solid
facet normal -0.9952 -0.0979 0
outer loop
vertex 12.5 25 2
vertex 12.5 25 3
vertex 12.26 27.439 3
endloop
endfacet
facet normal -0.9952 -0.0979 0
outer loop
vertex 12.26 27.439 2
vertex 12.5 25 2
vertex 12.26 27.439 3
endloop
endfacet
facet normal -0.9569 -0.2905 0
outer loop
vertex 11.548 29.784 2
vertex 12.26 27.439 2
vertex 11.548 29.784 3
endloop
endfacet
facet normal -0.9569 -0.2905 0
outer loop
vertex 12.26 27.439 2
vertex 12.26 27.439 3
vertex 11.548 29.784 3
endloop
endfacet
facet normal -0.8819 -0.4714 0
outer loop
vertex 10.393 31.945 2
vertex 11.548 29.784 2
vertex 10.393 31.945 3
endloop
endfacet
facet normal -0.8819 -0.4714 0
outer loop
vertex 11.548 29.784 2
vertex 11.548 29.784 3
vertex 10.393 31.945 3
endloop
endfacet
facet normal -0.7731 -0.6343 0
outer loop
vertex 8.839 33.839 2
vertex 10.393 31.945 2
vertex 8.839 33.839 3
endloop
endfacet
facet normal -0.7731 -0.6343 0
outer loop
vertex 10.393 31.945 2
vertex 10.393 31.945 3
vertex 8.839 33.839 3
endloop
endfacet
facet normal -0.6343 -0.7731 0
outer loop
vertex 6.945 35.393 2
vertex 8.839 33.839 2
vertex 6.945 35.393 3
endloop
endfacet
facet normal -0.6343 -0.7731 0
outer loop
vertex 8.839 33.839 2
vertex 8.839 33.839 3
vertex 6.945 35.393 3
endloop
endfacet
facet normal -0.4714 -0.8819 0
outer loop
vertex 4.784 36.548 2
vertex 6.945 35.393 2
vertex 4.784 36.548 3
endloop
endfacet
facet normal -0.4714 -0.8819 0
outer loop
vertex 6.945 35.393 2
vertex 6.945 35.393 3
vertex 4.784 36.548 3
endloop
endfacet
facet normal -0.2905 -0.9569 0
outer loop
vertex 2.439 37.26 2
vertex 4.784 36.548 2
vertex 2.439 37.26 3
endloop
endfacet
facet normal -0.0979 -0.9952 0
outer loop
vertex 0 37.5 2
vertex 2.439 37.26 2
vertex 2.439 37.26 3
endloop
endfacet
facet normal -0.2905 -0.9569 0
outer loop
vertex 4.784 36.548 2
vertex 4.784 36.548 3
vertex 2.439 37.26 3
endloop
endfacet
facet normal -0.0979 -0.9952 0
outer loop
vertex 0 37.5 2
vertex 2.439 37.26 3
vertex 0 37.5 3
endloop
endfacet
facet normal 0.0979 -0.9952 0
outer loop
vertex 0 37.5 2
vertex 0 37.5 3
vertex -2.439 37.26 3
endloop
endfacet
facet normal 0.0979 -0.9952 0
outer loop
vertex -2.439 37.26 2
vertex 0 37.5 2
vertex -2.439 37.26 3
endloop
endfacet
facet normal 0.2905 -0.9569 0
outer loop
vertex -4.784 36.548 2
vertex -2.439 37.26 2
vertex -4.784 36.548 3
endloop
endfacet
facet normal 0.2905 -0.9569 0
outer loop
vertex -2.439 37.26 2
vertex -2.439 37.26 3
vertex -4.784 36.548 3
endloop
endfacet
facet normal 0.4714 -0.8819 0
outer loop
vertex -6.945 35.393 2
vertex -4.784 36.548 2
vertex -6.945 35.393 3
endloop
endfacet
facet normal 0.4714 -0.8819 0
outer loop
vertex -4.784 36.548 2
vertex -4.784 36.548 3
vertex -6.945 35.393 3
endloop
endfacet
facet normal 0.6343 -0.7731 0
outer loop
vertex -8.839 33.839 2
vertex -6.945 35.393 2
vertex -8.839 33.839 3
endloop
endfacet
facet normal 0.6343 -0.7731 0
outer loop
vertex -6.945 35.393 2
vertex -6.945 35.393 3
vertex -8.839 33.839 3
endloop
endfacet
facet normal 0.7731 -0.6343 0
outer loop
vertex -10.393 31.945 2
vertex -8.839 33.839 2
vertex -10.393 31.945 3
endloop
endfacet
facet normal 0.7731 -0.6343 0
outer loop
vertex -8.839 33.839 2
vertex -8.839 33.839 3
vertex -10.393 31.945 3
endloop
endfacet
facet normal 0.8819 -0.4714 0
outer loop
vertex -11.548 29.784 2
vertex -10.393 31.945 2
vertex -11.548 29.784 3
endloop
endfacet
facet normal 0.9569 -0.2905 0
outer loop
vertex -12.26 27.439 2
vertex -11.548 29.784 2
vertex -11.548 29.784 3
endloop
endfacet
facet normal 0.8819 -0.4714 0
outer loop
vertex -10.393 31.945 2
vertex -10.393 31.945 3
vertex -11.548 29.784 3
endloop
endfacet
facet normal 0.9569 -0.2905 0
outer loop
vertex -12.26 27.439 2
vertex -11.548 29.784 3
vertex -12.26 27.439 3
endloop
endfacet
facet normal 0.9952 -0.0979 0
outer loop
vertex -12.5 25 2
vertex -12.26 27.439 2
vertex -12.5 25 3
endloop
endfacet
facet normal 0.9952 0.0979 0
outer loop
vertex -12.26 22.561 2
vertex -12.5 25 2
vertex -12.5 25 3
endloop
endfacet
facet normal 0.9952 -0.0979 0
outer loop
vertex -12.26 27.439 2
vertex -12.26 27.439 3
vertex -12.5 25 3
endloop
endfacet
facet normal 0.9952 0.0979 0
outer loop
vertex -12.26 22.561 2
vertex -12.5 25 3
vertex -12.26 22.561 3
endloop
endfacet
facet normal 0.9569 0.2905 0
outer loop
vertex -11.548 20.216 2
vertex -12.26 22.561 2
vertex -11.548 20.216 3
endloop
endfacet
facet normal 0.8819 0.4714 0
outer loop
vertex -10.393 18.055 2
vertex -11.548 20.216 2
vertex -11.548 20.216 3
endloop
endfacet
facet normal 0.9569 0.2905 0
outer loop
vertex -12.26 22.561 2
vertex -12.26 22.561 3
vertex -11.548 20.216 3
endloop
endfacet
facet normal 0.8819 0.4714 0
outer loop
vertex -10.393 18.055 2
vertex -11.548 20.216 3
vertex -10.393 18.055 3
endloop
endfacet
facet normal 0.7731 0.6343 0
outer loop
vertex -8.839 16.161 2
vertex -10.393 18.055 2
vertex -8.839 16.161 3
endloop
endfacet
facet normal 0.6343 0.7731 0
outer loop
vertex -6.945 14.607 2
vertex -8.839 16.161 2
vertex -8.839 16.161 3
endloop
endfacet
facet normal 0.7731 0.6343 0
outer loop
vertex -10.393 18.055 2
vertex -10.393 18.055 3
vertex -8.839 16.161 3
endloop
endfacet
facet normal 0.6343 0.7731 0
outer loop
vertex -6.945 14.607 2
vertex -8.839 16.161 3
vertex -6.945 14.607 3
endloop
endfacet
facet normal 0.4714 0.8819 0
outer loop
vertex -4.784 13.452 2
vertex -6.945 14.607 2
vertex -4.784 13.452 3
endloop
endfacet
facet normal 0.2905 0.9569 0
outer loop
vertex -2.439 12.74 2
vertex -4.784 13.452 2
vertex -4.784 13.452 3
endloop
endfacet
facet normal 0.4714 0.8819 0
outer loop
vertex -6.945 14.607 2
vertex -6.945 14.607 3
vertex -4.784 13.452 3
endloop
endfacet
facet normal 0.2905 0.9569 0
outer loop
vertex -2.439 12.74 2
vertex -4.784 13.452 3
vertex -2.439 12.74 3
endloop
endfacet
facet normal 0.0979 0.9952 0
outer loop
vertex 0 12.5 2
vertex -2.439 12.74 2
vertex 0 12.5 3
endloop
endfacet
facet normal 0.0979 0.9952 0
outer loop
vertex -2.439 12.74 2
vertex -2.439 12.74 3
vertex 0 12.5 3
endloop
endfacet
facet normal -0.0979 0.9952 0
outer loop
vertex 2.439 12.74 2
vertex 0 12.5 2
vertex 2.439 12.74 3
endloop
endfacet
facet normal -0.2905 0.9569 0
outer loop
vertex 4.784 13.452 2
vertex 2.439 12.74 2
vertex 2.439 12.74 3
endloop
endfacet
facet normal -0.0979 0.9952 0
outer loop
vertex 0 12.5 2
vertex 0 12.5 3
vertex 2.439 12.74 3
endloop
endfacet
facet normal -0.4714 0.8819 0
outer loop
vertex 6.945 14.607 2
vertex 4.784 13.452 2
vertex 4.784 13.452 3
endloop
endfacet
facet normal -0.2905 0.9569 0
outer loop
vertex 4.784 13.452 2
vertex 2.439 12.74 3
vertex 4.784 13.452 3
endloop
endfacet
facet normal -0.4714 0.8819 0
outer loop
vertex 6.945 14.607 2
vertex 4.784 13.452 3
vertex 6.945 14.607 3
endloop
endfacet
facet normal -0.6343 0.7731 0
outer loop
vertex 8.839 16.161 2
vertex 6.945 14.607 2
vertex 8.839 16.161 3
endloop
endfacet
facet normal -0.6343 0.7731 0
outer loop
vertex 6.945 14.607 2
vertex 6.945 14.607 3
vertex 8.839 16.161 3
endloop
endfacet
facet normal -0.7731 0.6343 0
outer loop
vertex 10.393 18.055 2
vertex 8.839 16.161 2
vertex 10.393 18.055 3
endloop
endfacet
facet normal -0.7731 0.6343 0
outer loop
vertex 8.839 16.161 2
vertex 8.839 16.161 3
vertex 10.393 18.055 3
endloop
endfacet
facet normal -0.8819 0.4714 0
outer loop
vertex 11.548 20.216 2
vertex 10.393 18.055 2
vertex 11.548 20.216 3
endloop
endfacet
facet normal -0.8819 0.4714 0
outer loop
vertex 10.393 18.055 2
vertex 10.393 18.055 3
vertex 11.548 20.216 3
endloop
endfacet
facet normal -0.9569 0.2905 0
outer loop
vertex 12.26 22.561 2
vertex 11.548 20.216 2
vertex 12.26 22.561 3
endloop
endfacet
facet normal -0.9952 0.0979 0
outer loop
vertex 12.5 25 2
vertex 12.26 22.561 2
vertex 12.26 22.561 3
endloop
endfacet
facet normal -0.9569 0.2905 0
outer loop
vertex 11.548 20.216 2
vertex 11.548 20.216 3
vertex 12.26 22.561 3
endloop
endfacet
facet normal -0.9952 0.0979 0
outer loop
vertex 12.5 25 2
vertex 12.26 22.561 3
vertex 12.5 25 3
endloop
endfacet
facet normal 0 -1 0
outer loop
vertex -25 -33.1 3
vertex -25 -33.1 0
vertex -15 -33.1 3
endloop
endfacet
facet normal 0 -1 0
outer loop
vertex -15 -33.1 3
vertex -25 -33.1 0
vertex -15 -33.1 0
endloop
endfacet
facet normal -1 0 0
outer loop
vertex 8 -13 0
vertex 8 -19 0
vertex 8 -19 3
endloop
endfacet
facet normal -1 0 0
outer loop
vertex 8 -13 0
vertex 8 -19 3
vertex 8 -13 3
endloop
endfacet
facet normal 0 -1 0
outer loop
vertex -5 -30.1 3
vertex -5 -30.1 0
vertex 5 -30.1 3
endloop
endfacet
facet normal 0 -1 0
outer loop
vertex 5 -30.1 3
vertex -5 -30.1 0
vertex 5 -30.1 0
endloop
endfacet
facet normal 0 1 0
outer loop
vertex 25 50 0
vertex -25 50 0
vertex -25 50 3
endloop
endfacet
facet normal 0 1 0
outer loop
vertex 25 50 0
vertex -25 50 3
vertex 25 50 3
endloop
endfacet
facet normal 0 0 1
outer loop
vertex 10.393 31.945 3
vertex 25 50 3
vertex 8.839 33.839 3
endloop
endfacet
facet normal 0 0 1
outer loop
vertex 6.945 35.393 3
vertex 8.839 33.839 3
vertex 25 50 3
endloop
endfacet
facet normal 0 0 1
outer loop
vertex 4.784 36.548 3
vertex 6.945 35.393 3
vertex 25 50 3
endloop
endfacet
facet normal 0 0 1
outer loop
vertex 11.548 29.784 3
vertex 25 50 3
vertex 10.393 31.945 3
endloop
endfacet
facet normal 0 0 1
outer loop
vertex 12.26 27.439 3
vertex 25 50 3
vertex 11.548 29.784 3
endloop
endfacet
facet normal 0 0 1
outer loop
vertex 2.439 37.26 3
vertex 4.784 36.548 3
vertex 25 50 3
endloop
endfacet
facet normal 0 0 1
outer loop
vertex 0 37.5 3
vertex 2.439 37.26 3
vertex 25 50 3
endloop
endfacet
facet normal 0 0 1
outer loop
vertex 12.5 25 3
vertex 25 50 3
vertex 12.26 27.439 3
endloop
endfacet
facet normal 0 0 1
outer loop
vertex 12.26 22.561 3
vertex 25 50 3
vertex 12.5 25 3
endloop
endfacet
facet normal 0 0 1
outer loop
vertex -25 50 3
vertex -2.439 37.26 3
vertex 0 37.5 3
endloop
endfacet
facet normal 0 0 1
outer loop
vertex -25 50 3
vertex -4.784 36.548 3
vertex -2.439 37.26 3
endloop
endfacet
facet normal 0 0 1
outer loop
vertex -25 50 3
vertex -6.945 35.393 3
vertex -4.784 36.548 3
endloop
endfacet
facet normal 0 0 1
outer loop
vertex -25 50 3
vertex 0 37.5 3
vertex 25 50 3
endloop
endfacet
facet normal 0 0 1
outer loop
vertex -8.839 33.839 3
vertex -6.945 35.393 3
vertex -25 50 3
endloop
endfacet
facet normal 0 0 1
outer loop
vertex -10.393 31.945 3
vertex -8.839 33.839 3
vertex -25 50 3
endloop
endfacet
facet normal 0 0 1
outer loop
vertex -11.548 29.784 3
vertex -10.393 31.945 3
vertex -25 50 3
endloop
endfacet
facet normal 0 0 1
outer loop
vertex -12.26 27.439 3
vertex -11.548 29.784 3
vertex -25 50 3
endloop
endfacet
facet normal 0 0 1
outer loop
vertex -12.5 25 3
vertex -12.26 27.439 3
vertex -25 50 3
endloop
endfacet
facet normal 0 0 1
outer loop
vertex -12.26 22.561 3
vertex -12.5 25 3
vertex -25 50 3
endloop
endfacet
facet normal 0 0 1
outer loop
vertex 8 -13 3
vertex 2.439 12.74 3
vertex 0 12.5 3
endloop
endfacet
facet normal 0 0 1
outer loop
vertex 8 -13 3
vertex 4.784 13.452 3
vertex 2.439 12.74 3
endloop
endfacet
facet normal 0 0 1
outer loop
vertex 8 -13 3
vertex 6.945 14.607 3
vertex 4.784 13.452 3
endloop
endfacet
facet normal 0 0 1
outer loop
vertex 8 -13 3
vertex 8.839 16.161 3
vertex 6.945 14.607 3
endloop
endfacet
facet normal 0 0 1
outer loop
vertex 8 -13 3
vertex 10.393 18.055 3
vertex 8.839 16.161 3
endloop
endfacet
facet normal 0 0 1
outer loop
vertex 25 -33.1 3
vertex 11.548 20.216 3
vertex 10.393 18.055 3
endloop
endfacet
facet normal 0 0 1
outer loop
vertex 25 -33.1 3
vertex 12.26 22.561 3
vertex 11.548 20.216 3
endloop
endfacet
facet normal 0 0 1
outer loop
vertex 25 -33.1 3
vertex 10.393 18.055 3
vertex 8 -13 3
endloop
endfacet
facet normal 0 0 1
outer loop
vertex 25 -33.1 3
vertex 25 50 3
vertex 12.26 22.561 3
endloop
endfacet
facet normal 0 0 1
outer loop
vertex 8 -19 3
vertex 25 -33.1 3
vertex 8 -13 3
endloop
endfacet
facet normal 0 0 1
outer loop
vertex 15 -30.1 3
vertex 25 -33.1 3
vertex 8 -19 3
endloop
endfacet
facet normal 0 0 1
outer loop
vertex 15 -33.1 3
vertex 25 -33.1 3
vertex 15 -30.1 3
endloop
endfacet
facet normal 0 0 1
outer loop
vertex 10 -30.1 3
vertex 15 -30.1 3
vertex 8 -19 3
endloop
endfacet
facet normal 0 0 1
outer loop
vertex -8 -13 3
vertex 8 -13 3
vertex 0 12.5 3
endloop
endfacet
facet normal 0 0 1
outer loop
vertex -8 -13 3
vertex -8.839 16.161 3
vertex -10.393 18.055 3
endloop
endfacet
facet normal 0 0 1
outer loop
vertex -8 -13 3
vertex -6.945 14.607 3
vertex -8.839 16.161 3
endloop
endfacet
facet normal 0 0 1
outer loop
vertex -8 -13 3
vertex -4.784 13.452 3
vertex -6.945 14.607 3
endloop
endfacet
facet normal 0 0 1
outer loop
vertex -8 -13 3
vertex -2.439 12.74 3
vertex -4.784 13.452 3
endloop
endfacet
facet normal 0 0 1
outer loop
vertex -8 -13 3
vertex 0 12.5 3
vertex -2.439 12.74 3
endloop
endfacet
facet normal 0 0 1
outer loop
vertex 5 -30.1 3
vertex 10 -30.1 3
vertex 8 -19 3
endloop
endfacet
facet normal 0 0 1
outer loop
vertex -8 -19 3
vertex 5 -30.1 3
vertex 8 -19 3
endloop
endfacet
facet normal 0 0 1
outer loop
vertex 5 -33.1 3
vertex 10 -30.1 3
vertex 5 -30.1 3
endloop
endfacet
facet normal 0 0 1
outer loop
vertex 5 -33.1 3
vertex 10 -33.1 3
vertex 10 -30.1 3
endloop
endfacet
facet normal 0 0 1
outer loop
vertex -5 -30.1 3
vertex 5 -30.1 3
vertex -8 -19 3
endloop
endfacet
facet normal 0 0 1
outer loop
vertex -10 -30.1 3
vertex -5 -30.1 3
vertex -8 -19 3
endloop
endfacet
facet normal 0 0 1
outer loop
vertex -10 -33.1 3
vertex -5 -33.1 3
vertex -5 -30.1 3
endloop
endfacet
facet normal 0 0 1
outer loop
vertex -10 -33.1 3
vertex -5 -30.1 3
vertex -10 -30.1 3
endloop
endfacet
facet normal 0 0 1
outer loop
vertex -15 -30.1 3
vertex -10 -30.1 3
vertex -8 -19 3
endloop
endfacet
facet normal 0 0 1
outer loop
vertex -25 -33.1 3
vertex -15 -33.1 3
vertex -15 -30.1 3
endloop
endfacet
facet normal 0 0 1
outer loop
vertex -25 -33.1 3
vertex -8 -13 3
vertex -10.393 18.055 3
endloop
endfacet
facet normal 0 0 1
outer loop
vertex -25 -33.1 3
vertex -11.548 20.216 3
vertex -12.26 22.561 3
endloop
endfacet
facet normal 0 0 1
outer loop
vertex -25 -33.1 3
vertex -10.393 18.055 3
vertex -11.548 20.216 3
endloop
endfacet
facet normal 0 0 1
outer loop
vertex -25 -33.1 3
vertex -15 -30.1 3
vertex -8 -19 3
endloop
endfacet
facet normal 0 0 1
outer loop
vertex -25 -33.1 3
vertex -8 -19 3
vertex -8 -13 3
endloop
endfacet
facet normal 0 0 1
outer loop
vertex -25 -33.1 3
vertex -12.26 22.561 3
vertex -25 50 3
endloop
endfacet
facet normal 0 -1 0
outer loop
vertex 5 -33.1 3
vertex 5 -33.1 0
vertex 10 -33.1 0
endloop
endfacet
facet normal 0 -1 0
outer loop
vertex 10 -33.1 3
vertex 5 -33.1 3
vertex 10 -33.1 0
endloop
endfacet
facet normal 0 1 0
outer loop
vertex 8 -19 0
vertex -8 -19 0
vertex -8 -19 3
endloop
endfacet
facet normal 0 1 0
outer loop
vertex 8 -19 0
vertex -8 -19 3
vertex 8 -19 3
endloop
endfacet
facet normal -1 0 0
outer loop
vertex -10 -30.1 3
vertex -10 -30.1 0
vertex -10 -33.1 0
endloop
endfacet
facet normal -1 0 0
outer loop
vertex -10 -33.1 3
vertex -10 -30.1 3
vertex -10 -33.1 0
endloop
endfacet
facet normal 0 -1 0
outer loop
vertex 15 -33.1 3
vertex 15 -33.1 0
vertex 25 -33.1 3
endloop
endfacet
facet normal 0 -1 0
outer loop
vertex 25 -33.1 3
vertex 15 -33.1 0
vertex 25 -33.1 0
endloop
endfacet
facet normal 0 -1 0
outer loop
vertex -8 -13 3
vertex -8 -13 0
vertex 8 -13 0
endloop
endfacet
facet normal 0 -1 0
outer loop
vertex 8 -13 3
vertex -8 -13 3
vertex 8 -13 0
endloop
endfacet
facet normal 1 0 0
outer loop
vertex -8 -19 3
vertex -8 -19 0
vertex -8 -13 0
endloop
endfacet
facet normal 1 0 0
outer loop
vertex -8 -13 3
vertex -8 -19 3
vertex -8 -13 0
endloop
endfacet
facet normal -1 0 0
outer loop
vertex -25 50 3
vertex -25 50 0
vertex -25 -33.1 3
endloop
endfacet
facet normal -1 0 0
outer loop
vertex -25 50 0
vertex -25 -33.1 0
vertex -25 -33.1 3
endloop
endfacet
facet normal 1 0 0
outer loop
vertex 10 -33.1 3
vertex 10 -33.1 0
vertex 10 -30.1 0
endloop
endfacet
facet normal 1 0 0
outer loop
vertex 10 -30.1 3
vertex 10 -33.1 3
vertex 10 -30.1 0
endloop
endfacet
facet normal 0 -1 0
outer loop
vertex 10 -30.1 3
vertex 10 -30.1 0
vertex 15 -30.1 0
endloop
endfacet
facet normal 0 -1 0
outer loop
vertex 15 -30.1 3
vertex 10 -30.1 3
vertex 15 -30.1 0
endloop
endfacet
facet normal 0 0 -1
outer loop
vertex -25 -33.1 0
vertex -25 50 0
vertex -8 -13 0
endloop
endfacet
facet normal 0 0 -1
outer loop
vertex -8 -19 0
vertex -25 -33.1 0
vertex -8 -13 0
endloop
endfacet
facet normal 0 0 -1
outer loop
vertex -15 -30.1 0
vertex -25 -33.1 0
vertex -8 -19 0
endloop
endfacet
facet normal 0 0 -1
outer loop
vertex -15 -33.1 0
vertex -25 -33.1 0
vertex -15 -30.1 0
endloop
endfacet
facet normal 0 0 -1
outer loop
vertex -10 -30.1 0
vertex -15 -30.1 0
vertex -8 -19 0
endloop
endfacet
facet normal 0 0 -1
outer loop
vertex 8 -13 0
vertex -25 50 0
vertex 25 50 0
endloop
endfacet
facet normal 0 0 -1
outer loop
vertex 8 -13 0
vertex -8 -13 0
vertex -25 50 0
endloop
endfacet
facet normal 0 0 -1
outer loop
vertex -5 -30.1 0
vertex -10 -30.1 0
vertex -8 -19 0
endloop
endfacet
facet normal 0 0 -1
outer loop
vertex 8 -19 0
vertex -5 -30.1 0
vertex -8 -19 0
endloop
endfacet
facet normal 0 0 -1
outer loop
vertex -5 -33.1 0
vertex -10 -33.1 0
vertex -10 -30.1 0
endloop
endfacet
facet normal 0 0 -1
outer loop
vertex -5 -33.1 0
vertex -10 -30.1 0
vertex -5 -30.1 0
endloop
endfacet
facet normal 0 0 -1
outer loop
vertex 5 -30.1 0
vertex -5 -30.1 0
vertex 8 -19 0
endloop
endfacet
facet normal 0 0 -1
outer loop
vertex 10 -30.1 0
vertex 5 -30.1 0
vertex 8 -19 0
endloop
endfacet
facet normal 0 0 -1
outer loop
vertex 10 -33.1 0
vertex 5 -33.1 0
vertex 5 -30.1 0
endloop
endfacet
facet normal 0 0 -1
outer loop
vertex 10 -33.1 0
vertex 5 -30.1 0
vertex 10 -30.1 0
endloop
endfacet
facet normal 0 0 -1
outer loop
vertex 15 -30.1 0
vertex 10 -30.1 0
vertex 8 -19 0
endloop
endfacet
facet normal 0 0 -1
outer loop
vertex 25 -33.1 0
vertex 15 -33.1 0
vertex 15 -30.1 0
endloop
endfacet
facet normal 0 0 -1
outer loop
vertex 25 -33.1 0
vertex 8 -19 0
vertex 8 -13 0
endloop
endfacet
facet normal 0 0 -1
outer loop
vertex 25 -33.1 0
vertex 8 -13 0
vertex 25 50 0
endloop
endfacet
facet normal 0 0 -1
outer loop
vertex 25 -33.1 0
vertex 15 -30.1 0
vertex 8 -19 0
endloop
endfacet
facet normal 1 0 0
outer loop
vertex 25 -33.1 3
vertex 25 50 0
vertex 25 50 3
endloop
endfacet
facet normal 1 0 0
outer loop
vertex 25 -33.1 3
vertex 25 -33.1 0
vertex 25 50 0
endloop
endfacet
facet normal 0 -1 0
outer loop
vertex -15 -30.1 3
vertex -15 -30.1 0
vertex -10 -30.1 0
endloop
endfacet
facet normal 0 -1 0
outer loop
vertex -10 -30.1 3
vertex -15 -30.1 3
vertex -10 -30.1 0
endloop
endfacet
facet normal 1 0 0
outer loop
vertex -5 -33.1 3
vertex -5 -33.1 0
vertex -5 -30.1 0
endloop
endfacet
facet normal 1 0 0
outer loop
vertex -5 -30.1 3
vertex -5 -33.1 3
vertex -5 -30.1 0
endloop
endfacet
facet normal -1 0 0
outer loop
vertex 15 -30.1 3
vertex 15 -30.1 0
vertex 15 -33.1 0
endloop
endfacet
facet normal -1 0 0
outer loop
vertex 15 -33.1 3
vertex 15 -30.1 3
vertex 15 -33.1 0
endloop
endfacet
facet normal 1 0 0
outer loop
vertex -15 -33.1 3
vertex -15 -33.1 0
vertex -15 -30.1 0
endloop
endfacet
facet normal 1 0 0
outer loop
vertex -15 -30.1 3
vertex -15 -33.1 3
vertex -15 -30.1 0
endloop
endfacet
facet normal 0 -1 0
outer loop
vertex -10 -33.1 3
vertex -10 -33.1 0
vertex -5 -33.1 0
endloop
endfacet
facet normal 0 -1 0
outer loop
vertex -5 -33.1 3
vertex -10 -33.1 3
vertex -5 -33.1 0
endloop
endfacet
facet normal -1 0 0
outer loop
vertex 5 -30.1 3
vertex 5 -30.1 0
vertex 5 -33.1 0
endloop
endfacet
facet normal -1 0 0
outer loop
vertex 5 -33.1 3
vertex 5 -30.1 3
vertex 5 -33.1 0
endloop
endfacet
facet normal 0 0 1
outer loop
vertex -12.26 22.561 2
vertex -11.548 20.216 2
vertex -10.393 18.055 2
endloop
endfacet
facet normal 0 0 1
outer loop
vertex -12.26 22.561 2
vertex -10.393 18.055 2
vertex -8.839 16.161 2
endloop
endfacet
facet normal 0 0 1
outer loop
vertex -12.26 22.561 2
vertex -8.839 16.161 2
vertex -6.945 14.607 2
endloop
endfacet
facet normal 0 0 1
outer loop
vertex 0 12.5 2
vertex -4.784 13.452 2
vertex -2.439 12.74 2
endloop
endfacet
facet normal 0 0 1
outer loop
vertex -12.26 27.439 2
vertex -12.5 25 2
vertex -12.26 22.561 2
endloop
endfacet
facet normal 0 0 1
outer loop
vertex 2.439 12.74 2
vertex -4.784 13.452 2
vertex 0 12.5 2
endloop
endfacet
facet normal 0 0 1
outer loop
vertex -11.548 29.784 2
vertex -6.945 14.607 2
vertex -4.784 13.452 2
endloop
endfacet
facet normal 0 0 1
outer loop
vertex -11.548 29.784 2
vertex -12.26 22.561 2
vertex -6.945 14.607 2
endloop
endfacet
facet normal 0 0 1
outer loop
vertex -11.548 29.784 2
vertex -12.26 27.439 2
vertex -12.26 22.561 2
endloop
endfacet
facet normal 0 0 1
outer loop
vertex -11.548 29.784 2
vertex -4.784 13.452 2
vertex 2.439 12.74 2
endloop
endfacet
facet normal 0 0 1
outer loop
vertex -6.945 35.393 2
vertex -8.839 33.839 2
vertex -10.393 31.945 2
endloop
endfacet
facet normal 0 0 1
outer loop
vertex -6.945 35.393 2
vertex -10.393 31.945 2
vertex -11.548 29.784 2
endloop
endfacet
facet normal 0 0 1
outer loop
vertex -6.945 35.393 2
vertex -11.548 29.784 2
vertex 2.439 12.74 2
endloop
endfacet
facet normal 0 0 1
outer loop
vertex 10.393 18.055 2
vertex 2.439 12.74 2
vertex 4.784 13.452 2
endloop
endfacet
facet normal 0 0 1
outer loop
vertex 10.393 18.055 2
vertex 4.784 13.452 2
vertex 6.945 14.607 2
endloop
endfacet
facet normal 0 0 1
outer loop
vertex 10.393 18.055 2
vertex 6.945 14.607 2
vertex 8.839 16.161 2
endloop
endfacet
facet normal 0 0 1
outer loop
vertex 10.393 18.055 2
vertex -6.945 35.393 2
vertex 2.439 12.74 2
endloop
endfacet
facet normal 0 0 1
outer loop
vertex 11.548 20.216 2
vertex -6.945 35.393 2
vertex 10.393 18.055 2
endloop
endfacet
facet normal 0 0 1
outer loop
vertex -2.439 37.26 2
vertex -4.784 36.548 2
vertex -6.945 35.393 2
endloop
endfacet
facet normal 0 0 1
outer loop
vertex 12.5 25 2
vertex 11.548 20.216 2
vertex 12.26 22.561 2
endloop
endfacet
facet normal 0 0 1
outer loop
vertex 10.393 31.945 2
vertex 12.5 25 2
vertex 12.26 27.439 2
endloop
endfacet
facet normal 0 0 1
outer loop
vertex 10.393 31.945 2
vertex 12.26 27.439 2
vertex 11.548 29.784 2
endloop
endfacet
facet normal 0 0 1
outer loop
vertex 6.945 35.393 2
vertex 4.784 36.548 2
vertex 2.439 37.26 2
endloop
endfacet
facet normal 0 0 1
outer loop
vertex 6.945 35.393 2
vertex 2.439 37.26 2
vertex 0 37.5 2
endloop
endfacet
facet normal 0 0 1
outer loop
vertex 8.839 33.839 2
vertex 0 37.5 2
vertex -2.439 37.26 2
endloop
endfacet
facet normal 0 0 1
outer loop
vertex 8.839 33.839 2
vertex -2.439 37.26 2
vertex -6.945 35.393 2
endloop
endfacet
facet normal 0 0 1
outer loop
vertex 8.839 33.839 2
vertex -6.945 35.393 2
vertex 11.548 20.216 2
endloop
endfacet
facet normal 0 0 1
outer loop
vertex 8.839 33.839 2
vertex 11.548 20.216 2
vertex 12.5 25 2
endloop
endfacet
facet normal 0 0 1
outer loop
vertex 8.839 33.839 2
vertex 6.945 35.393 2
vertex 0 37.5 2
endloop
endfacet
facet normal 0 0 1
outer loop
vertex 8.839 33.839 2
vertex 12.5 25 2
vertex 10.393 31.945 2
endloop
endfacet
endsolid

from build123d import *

# Parameters (mm, degrees)
SKETCH1_W            = 16
SKETCH1_H            = 6
BOSS_EXTRUDE1_DEPTH  = 3
MOVE_FACE1_OUTLINE_W = 5
MOVE_FACE1_OUTLINE_H = 53.1
MOVE_FACE1_DEPTH     = 3
MOVE_FACE2_BY        = 30
SKETCH2_R            = 12.5
CUT_EXTRUDE1_DEPTH   = 1


# Read off the part's stored shape, not the designer's step: Move Face1
with BuildPart() as part:
    # Sketch1 → Boss-Extrude1 (new body)
    with BuildSketch(Plane.XY):
        Polygon((-20, 20), (-20, -30.1), (-20, -33.1), (-15, -33.1), (-15, -30.1), (-10, -30.1), (-10, -33.1), (-5, -33.1), (-5, -30.1), (5, -30.1), (5, -33.1), (10, -33.1), (10, -30.1), (15, -30.1), (15, -33.1), (20, -33.1), (20, -30.1), (20, 20), align=None)
        with Locations((0, -16)):
            Rectangle(SKETCH1_W, SKETCH1_H, mode=Mode.SUBTRACT)
    extrude(amount=BOSS_EXTRUDE1_DEPTH)

    # Move Face1 outline → Move Face1 (add)
    with BuildSketch(Plane.XY):
        with Locations((22.5, -6.55)):
            Rectangle(MOVE_FACE1_OUTLINE_W, MOVE_FACE1_OUTLINE_H)
        with Locations((-22.5, -6.55)):
            Rectangle(MOVE_FACE1_OUTLINE_W, MOVE_FACE1_OUTLINE_H)
    extrude(amount=MOVE_FACE1_DEPTH)

    # Move Face2: a face moved outward by 30.0
    extrude(part.faces().sort_by_distance((0, 20, 1.5))[0], amount=MOVE_FACE2_BY, dir=(0, 1, 0))

    # Sketch2 → Cut-Extrude1 (cut)
    with BuildSketch(Plane.XY.offset(3)):
        with Locations((0, 25)):
            Circle(SKETCH2_R)
    extrude(amount=-CUT_EXTRUDE1_DEPTH, mode=Mode.SUBTRACT)


solid = part.part
